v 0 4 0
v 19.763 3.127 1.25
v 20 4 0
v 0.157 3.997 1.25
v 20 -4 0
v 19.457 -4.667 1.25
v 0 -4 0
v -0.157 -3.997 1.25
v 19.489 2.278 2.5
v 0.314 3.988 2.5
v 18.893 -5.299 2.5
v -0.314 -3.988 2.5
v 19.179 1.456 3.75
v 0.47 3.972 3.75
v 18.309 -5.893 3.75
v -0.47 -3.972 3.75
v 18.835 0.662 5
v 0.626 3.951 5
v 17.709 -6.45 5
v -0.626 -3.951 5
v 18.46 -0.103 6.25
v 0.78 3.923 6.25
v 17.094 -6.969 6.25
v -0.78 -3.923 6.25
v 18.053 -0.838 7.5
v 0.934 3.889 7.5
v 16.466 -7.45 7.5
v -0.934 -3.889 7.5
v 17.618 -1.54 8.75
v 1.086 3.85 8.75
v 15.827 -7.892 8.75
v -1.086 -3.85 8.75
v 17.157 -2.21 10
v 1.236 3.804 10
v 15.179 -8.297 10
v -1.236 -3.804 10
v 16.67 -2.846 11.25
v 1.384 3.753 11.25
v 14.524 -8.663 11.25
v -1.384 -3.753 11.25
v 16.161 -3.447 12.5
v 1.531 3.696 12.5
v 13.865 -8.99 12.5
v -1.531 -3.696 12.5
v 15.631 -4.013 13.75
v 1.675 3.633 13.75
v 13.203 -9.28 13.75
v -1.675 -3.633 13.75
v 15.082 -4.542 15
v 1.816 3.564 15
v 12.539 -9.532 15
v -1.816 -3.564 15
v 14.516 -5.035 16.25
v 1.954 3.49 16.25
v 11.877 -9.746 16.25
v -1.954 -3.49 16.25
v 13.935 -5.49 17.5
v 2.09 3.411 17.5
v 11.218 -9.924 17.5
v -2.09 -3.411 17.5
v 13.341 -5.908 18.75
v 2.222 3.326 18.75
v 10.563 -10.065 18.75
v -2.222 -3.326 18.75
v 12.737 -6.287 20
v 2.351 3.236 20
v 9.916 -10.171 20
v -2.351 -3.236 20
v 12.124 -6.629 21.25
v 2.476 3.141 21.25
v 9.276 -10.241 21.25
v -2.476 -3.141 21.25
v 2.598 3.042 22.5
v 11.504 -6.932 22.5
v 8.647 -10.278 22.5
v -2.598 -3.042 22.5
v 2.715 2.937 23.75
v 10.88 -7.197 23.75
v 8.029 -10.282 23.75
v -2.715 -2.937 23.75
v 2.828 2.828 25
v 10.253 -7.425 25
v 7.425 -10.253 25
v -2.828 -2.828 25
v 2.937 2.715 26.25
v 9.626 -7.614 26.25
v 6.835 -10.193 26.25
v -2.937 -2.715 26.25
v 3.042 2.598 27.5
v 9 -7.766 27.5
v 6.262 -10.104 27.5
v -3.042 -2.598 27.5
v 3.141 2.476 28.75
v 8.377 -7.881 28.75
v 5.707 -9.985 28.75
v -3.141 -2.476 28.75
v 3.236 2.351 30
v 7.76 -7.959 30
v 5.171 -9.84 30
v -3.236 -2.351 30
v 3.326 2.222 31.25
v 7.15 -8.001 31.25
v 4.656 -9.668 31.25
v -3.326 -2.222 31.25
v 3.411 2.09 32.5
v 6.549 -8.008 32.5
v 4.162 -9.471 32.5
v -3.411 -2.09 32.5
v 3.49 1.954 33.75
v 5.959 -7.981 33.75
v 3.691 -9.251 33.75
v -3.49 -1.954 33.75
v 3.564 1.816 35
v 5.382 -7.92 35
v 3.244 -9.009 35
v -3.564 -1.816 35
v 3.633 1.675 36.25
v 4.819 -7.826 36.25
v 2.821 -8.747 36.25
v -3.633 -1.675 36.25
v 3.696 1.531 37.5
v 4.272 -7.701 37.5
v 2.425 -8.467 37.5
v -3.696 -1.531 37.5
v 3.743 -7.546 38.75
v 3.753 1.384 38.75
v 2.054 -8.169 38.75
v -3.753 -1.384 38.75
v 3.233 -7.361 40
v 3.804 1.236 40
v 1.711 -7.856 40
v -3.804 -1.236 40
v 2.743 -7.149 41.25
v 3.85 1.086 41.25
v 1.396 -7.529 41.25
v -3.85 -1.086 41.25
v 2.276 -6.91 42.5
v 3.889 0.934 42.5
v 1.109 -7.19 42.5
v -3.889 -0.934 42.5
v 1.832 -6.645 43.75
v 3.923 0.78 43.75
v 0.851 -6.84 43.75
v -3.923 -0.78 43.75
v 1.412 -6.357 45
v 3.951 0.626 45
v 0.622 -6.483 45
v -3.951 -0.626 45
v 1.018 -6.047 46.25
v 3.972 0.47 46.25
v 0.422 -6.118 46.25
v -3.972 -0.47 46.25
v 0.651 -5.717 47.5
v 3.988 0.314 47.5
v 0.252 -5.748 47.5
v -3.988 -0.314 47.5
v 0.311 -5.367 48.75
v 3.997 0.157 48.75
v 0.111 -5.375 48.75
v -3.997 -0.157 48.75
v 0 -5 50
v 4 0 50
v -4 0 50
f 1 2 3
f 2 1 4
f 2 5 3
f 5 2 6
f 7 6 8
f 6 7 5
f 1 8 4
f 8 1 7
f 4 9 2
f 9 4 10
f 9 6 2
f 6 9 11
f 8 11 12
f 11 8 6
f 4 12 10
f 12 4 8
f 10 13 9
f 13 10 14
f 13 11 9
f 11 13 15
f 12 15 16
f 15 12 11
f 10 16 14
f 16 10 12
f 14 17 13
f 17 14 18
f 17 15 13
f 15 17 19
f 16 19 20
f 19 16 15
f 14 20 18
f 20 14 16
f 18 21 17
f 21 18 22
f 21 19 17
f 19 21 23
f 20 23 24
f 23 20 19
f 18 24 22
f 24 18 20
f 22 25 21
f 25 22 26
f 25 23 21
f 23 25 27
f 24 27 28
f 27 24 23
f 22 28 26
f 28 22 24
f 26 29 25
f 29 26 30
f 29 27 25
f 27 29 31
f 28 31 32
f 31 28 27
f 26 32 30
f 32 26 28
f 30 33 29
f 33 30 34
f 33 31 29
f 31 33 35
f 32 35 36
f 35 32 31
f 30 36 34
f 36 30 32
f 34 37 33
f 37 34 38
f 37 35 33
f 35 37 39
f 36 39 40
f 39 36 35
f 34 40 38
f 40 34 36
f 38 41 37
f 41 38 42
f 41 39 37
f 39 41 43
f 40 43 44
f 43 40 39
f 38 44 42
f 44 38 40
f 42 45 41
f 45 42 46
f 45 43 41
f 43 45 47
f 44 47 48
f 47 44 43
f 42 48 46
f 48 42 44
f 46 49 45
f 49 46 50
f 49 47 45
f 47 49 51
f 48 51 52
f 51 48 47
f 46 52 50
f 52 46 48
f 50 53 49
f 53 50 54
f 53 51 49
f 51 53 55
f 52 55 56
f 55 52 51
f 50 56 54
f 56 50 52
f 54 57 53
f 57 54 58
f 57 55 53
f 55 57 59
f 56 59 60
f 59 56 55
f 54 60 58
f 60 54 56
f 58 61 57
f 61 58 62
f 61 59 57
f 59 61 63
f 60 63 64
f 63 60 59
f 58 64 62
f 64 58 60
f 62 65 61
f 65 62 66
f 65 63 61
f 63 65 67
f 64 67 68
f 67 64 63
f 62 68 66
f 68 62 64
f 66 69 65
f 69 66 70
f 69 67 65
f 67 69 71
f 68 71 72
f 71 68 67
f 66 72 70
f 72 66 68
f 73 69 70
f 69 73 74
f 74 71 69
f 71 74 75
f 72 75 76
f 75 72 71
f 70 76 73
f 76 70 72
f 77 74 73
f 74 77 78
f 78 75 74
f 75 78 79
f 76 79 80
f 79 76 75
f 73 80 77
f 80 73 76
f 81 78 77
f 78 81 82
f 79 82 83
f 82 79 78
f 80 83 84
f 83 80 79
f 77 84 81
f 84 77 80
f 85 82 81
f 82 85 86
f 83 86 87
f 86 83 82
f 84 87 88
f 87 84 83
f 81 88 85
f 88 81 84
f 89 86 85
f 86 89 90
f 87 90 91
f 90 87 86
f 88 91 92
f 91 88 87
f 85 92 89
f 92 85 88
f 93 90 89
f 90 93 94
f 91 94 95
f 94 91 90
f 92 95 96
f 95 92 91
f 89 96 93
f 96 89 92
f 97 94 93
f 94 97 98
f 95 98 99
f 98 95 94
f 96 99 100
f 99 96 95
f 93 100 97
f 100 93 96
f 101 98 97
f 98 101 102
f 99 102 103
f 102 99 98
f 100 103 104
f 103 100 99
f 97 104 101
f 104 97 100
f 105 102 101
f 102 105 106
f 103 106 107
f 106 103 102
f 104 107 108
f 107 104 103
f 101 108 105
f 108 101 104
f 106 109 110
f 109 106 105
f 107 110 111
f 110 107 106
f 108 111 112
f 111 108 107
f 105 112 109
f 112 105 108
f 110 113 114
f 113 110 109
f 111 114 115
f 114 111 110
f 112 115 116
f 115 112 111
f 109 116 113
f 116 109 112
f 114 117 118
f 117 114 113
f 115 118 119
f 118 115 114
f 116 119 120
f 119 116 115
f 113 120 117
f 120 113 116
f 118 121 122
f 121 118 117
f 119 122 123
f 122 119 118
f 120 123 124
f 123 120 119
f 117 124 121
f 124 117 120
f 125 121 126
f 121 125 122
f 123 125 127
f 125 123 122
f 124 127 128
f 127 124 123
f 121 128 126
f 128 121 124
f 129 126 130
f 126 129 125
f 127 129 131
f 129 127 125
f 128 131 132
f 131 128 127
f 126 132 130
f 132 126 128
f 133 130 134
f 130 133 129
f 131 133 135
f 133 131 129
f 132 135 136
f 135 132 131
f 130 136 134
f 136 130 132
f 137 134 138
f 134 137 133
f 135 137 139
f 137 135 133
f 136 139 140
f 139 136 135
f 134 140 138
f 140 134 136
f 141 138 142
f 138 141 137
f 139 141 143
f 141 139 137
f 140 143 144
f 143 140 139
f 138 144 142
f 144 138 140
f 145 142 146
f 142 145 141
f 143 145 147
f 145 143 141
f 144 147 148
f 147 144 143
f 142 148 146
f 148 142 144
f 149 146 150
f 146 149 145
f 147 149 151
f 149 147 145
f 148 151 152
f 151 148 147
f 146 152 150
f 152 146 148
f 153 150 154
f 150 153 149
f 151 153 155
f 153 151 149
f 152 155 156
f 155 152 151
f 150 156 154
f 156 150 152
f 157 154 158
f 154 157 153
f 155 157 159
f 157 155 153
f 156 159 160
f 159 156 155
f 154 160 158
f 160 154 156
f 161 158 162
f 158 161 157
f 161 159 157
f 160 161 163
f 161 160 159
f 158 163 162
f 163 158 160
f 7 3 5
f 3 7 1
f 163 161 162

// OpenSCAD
//  meshbuilder
//
//  This libray is designed to be used in conjuction with pathbuilder to create complex 3D shapes.
//  With pathbuilder (https://github.com/dinther/pathbuilder) it is easy to morph from one complex 2D shape
//  to another similar 2D shape. (See svgTweenPath command in pathbuilder for the limitations)
//
//  A mesh can be stiched by stacking multiple 2D shapes on top of each other.
//  kinda the reverse of how a slicer turns a 3D object in many outlines.
//  
//  The number of points on each stacked 2D shape need to match.
//
//  pointLayers is a list containing path lists with 3D points.
//  The module demo shows a simple rectangle that changes shape as it is moved up.
//  This shape can not be achieved with the twist parameter in linear_extrude.
//
//  Latest version here: https://github.com/dinther/pathbuilder
//
//  By: Paul van Dinther


//  TODO: aligning the start of the paths
//  TODO: learn about smarts to make better stiching decisions
//

//  buildMeshFromPointLayers(pointLayers, sides, bottom, top, closed, faces)
//
//  Generates a mesh based on a list of a list of points for each layer
//  pointLayers (list)   List of 3D points
//  sides       (bool)   Generate the sides of the mesh
//  bottom      (bool)   Generate the bottom of the mesh
//  top         (bool)   Generate the top of the mesh
//  closed      (bool)   Set to true if the side of the mesh should be closed
//  faces       (list)   User provided list of faces
//  return  (number) Angle between the two vectors in degrees.
module buildMeshFromPointLayers(pointLayers = [], sides = true, bottom=true, top=true, closed=true, faces=[]){
    n = len(pointLayers[0]);
    pts = [for (deck=[0:1:len(pointLayers)-1]) each pointLayers[deck]];
	side_faces = [for (d = [0:1:len(pointLayers)-2], p = [0:1:len(pointLayers[d])-(closed? 1 : 2)])	let(c = (n * d)+ p, last=p+1==len(pointLayers[d]) ) [c,last? d*n: c+1, last? c+1 : c+n+1, c+n]];
    bottom_faces = bottom? [[for(i=[n-1:-1:0]) i]] : [];
    top_faces = top? [[for(i=[len(pts) - n:len(pts)-1]) i]] : [];
	polyhedron(points = pts, faces = concat(side_faces, bottom_faces, top_faces, faces), convexity = 10);
}

function rotateAroundZ(x, y, z, angle) = let (
    c = cos(angle),
    s = sin(angle),
    nx = (c * x) + (s * y),
    ny = (c * y) - (s * x)) [nx, ny, z];


module demo(){
    steps = 40;
    l1 = 20;
    l2 = 5;
    ls = (l2-l1)/steps;
    w1 = 8;
    w2 = 0;
    ws = (w2-w1)/steps;
    h = 50;
    hs = h / steps;
    wh = w1 * 0.5;
    
    a = 90;
    as = a/steps;
    points = [[0,wh],[l1, wh],[l1,-wh],[0,-wh]];
    pl = [for (i=[0:steps])
        [rotateAroundZ(points[0][0], points[0][1], i*hs, i*as),
        rotateAroundZ(points[1][0]+i*ls, points[1][1]+ i*ws*0.5, i*hs, i*as),
        rotateAroundZ(points[2][0]+i*ls, points[2][1]- i*ws*0.5, i*hs, i*as),
        rotateAroundZ(points[3][0], points[3][1], i*hs, i*as)]
    ];
    
    buildMeshFromPointLayers(pl, true, true,true);
}

demo();
